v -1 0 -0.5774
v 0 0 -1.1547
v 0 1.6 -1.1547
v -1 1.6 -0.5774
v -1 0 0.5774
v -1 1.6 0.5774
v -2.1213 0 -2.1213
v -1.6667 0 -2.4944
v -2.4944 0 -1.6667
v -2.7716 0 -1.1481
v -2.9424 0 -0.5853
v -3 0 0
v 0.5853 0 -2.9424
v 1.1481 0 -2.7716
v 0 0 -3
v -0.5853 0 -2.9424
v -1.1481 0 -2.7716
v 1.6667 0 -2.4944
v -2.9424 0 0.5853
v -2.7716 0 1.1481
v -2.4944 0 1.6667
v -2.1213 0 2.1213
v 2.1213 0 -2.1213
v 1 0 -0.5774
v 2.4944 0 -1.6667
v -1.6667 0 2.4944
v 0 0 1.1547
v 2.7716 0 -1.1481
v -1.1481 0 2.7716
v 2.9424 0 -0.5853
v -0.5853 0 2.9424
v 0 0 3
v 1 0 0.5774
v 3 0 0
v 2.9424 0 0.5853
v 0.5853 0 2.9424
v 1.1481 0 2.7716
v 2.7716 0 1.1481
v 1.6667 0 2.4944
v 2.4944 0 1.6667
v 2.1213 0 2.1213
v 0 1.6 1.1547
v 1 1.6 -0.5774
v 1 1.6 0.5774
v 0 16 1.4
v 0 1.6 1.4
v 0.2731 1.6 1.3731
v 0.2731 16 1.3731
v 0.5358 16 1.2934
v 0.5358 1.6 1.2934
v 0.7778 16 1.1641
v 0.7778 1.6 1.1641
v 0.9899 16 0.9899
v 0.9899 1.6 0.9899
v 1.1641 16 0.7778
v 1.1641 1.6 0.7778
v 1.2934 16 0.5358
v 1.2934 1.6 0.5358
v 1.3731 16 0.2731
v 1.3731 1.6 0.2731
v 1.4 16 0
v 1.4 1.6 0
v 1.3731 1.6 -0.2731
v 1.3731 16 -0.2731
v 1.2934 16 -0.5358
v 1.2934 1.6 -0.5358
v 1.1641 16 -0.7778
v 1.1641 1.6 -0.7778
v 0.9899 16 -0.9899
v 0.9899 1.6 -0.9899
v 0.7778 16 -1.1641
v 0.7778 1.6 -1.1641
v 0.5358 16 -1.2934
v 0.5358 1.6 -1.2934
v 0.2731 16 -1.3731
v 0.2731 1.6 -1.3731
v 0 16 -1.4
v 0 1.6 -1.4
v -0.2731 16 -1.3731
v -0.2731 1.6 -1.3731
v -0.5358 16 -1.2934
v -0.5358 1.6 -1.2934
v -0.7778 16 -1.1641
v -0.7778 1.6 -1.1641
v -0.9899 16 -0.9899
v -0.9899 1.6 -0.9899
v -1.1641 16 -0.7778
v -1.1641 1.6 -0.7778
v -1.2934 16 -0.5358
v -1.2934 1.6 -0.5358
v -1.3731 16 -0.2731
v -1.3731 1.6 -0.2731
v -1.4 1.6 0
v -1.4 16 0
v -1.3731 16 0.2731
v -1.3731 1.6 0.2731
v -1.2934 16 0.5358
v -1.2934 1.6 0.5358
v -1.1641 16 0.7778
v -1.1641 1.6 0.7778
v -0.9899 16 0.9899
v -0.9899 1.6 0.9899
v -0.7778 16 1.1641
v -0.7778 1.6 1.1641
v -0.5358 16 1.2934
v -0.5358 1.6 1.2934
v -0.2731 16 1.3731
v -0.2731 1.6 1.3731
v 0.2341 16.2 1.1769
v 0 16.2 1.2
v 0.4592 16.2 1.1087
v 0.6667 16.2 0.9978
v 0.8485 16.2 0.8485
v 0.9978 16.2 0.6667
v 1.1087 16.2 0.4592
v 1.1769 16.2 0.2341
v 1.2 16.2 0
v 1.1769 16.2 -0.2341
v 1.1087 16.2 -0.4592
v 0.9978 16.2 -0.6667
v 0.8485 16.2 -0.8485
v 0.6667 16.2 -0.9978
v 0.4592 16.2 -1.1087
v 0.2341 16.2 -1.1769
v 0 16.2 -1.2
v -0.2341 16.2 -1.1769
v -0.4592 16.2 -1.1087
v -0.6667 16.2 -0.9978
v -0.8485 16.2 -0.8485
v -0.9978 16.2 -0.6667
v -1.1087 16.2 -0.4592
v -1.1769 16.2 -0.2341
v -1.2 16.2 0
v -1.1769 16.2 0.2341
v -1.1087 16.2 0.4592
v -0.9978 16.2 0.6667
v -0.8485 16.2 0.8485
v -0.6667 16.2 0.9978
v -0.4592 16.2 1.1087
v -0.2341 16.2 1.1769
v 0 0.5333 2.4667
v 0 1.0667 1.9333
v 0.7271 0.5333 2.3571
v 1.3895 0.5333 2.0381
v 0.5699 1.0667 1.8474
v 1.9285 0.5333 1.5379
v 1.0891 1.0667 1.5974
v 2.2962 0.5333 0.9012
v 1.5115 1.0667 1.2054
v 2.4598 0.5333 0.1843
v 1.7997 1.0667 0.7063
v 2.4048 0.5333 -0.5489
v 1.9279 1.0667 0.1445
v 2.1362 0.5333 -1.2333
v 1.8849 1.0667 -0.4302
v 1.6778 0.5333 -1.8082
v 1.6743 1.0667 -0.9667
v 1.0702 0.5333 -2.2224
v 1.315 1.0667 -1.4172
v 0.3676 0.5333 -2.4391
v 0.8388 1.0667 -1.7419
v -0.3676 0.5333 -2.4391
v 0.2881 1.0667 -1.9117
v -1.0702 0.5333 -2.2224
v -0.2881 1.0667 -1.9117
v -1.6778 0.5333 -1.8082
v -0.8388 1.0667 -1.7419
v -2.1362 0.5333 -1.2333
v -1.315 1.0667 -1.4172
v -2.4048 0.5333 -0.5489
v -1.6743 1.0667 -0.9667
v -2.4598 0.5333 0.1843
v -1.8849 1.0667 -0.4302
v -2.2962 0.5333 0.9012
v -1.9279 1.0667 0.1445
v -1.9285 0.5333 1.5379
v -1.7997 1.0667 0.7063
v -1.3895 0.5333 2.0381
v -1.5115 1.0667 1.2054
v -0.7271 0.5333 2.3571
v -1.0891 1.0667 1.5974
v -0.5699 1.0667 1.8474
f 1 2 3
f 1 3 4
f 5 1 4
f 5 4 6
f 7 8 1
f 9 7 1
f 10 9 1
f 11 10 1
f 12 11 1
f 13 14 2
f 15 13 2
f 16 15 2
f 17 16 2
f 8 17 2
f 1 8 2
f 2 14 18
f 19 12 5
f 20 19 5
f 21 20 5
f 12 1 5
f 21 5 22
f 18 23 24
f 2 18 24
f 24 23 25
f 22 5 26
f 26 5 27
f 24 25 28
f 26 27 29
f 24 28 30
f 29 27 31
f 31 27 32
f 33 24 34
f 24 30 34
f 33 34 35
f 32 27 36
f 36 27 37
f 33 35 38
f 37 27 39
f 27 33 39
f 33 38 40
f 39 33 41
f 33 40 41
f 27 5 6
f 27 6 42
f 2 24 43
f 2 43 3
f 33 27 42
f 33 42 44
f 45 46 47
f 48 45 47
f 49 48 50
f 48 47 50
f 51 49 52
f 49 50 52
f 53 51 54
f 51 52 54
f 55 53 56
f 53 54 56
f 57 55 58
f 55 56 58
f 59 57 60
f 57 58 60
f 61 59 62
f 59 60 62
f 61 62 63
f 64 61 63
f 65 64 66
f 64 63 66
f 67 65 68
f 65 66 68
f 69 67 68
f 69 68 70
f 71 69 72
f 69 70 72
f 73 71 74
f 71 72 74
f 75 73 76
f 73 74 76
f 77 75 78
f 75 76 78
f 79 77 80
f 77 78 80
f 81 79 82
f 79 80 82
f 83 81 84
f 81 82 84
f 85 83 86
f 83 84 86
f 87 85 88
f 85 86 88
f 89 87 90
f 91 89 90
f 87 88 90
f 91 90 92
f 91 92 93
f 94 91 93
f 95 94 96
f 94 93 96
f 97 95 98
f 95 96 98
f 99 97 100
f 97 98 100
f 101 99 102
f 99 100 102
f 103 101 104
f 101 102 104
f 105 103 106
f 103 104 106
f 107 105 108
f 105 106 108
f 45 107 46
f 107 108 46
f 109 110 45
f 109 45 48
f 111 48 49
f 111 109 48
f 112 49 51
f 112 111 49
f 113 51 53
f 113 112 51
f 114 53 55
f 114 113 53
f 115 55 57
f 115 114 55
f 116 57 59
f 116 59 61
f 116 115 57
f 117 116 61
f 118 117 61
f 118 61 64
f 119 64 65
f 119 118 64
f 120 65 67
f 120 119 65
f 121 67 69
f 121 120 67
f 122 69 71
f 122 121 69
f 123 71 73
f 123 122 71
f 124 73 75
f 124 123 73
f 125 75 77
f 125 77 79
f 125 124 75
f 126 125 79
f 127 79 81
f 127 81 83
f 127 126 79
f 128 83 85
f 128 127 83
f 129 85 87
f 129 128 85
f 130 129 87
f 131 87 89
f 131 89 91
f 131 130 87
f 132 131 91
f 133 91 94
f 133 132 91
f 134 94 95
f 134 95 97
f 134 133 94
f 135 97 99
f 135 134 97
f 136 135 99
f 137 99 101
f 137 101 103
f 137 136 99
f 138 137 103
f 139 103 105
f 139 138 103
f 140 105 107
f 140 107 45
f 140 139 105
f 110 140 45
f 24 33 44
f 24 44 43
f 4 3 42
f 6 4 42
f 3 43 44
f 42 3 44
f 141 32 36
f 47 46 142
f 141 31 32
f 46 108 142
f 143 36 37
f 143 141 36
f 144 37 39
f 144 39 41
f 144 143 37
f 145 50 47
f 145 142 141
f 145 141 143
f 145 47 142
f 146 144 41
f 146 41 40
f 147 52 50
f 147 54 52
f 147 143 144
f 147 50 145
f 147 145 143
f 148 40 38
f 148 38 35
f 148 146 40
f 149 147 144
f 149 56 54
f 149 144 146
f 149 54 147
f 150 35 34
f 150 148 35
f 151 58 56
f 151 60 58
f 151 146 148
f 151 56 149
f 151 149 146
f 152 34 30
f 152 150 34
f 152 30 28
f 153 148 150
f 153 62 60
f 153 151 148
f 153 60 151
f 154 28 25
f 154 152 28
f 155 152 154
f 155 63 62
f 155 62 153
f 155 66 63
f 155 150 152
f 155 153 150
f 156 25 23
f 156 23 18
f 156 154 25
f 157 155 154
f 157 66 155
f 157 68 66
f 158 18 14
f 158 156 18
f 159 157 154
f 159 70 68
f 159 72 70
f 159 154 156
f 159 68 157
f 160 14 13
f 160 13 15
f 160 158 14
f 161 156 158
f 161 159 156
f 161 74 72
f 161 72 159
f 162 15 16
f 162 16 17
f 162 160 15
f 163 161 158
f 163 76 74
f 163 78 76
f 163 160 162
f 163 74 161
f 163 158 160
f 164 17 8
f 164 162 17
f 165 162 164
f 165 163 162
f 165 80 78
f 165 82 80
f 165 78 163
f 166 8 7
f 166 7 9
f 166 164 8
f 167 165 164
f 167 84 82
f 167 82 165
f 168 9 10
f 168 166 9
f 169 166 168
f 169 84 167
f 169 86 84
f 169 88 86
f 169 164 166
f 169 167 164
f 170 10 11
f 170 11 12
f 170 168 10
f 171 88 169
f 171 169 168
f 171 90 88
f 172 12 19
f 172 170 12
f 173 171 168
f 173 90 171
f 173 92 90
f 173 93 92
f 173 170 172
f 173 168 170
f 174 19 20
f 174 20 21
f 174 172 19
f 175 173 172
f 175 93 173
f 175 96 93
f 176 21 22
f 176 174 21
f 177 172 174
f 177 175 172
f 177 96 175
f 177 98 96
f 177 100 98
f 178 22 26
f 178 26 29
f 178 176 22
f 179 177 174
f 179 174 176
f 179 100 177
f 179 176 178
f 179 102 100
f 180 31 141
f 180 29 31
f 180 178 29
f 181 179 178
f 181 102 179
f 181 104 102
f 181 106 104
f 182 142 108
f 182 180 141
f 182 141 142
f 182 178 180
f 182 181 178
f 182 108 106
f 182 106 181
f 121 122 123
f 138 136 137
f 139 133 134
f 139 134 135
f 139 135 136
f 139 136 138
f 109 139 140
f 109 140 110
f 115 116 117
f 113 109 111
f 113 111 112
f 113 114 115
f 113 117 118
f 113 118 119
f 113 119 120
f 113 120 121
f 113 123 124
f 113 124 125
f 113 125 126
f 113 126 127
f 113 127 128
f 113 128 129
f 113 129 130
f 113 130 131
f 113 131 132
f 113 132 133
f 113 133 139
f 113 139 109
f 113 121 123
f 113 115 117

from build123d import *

# Parameters (mm, degrees)
SKETCH_1_R      = 3
EXTRUDE_1_DEPTH = 1.6
CHAMFER_1_SIZE  = 1.6
SKETCH_2_R      = 1.4
EXTRUDE_2_DEPTH = 14.6
CHAMFER_2_SIZE  = 0.2


with BuildPart() as part:
    # 草图1 → 凸台-拉伸1 (new body)
    with BuildSketch(Plane(origin=(0, 0, 0), x_dir=(1, 0, 0), z_dir=(0, 1, 0))):
        with Locations(Location((0, 0, 0), (0, 0, 270))):
            Circle(SKETCH_1_R)
        Polygon((0, -1.154700538), (1, -0.577350269), (1, 0.577350269), (0, 1.154700538), (-1, 0.577350269), (-1, -0.577350269), align=None, mode=Mode.SUBTRACT)
    extrude(amount=EXTRUDE_1_DEPTH)

    # 倒角1
    # the kernel refuses this chamfer: 1.6 mm, written as the material it takes off along each edge
    with BuildSketch(Plane(origin=(0, 1.6, 0), x_dir=(0, 0, 1), z_dir=(-1, 0, 0))) as chamfer_1_piece_1:
        Polygon((3, -CHAMFER_1_SIZE), (3 - CHAMFER_1_SIZE, 0), (3, 0), align=None)
    revolve(axis=Axis((0, 1.6, 0), (0, 1, 0)), mode=Mode.SUBTRACT)

    # 草图2 → 凸台-拉伸2 (add)
    with BuildSketch(Plane(origin=(0, 1.6, 0), x_dir=(1, 0, 0), z_dir=(0, 1, 0))):
        with Locations(Location((0, 0, 0), (0, 0, 270))):
            Circle(SKETCH_2_R)
    extrude(amount=EXTRUDE_2_DEPTH)

    # 倒角2
    chamfer_2_edges = [part.edges().sort_by_distance(p)[0] for p in [
        (0, 16.2, -1.4),
    ]]
    chamfer(chamfer_2_edges, length=CHAMFER_2_SIZE)


solid = part.part
